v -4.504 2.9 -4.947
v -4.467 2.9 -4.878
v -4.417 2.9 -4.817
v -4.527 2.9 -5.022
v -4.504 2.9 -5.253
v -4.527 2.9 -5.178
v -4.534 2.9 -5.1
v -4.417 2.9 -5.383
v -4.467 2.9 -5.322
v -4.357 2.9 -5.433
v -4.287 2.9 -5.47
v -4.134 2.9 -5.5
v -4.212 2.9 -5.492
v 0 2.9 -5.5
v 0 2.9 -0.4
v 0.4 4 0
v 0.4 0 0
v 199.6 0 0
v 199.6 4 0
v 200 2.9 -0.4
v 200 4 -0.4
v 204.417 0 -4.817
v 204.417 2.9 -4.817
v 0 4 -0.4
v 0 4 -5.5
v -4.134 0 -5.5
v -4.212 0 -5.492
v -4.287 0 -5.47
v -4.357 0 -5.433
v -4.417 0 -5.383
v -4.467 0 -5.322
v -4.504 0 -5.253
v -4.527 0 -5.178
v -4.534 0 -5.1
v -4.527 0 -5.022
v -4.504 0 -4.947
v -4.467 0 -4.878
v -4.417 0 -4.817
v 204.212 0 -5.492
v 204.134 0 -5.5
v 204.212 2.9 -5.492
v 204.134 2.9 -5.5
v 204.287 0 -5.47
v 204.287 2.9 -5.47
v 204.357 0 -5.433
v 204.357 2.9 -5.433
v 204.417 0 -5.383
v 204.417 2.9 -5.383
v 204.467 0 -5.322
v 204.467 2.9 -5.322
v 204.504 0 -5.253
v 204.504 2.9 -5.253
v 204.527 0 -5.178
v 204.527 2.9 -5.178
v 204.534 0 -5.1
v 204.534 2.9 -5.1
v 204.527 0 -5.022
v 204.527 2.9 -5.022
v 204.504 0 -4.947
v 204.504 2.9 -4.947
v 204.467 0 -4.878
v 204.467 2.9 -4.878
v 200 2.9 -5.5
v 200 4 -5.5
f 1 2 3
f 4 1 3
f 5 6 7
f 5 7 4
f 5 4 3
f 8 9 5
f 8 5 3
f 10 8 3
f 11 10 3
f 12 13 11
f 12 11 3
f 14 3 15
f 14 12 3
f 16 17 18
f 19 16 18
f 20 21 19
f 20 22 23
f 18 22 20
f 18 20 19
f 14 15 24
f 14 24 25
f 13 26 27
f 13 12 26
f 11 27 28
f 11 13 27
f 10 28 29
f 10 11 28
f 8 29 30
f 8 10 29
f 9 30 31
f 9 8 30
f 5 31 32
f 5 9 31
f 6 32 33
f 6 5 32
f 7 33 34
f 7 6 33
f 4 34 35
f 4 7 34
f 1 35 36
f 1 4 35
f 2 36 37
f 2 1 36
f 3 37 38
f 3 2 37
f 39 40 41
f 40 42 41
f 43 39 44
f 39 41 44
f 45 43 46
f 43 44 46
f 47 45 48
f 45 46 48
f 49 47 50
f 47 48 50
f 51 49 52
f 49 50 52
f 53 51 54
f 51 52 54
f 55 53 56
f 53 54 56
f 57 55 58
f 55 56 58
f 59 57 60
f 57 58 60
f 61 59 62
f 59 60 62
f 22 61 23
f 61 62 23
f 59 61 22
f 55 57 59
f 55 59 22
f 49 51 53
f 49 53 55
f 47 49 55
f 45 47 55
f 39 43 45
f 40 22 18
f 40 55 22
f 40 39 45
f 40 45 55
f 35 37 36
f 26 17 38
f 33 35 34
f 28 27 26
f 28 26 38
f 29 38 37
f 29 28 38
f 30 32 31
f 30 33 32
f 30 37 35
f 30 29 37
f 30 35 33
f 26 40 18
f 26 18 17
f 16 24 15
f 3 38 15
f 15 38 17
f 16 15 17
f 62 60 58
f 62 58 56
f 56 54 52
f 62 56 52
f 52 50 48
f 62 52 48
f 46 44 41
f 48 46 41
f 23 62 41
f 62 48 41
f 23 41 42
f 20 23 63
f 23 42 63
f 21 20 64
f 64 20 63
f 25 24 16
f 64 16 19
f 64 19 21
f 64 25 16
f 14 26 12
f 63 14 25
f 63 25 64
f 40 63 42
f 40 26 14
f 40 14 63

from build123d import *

# Parameters (mm, degrees)
ESQUISSE1_W        = 200
ESQUISSE1_H        = 5.5
BOSS_EXTRU_1_DEPTH = 4
CHANFREIN1_SIZE    = 0.4
BOSS_EXTRU_2_DEPTH = 2.9
CONG_1_R           = 0.4


with BuildPart() as part:
    # Esquisse1 → Boss.-Extru.1 (new body)
    with BuildSketch(Plane(origin=(0, 0, 0), x_dir=(1, 0, 0), z_dir=(0, 1, 0))):
        with Locations((100, 2.75)):
            Rectangle(ESQUISSE1_W, ESQUISSE1_H)
    extrude(amount=BOSS_EXTRU_1_DEPTH)

    # Chanfrein1
    chanfrein1_edges = [part.edges().sort_by_distance(p)[0] for p in [
        (200, 2, 0),
        (0, 2, 0),
    ]]
    chamfer(chanfrein1_edges, length=CHANFREIN1_SIZE)

    # Esquisse2 → Boss.-Extru.2 (add)
    with BuildSketch(Plane(origin=(0, 0, 0), x_dir=(1, 0, 0), z_dir=(0, 1, 0))):
        Polygon((0, 5.5), (-5.1, 5.5), (0, 0.4), align=None)
    boss_extru_2 = extrude(amount=BOSS_EXTRU_2_DEPTH)

    # Symétrie1: Boss.-Extru.2 across plane
    add(boss_extru_2.mirror(Plane.ZY.offset(-100)))

    # Congé1
    cong_1_edges = [part.edges().sort_by_distance(p)[0] for p in [
        (-5.1, 1.45, -5.5),
        (205.1, 1.45, -5.5),
    ]]
    fillet(cong_1_edges, radius=CONG_1_R)


solid = part.part
